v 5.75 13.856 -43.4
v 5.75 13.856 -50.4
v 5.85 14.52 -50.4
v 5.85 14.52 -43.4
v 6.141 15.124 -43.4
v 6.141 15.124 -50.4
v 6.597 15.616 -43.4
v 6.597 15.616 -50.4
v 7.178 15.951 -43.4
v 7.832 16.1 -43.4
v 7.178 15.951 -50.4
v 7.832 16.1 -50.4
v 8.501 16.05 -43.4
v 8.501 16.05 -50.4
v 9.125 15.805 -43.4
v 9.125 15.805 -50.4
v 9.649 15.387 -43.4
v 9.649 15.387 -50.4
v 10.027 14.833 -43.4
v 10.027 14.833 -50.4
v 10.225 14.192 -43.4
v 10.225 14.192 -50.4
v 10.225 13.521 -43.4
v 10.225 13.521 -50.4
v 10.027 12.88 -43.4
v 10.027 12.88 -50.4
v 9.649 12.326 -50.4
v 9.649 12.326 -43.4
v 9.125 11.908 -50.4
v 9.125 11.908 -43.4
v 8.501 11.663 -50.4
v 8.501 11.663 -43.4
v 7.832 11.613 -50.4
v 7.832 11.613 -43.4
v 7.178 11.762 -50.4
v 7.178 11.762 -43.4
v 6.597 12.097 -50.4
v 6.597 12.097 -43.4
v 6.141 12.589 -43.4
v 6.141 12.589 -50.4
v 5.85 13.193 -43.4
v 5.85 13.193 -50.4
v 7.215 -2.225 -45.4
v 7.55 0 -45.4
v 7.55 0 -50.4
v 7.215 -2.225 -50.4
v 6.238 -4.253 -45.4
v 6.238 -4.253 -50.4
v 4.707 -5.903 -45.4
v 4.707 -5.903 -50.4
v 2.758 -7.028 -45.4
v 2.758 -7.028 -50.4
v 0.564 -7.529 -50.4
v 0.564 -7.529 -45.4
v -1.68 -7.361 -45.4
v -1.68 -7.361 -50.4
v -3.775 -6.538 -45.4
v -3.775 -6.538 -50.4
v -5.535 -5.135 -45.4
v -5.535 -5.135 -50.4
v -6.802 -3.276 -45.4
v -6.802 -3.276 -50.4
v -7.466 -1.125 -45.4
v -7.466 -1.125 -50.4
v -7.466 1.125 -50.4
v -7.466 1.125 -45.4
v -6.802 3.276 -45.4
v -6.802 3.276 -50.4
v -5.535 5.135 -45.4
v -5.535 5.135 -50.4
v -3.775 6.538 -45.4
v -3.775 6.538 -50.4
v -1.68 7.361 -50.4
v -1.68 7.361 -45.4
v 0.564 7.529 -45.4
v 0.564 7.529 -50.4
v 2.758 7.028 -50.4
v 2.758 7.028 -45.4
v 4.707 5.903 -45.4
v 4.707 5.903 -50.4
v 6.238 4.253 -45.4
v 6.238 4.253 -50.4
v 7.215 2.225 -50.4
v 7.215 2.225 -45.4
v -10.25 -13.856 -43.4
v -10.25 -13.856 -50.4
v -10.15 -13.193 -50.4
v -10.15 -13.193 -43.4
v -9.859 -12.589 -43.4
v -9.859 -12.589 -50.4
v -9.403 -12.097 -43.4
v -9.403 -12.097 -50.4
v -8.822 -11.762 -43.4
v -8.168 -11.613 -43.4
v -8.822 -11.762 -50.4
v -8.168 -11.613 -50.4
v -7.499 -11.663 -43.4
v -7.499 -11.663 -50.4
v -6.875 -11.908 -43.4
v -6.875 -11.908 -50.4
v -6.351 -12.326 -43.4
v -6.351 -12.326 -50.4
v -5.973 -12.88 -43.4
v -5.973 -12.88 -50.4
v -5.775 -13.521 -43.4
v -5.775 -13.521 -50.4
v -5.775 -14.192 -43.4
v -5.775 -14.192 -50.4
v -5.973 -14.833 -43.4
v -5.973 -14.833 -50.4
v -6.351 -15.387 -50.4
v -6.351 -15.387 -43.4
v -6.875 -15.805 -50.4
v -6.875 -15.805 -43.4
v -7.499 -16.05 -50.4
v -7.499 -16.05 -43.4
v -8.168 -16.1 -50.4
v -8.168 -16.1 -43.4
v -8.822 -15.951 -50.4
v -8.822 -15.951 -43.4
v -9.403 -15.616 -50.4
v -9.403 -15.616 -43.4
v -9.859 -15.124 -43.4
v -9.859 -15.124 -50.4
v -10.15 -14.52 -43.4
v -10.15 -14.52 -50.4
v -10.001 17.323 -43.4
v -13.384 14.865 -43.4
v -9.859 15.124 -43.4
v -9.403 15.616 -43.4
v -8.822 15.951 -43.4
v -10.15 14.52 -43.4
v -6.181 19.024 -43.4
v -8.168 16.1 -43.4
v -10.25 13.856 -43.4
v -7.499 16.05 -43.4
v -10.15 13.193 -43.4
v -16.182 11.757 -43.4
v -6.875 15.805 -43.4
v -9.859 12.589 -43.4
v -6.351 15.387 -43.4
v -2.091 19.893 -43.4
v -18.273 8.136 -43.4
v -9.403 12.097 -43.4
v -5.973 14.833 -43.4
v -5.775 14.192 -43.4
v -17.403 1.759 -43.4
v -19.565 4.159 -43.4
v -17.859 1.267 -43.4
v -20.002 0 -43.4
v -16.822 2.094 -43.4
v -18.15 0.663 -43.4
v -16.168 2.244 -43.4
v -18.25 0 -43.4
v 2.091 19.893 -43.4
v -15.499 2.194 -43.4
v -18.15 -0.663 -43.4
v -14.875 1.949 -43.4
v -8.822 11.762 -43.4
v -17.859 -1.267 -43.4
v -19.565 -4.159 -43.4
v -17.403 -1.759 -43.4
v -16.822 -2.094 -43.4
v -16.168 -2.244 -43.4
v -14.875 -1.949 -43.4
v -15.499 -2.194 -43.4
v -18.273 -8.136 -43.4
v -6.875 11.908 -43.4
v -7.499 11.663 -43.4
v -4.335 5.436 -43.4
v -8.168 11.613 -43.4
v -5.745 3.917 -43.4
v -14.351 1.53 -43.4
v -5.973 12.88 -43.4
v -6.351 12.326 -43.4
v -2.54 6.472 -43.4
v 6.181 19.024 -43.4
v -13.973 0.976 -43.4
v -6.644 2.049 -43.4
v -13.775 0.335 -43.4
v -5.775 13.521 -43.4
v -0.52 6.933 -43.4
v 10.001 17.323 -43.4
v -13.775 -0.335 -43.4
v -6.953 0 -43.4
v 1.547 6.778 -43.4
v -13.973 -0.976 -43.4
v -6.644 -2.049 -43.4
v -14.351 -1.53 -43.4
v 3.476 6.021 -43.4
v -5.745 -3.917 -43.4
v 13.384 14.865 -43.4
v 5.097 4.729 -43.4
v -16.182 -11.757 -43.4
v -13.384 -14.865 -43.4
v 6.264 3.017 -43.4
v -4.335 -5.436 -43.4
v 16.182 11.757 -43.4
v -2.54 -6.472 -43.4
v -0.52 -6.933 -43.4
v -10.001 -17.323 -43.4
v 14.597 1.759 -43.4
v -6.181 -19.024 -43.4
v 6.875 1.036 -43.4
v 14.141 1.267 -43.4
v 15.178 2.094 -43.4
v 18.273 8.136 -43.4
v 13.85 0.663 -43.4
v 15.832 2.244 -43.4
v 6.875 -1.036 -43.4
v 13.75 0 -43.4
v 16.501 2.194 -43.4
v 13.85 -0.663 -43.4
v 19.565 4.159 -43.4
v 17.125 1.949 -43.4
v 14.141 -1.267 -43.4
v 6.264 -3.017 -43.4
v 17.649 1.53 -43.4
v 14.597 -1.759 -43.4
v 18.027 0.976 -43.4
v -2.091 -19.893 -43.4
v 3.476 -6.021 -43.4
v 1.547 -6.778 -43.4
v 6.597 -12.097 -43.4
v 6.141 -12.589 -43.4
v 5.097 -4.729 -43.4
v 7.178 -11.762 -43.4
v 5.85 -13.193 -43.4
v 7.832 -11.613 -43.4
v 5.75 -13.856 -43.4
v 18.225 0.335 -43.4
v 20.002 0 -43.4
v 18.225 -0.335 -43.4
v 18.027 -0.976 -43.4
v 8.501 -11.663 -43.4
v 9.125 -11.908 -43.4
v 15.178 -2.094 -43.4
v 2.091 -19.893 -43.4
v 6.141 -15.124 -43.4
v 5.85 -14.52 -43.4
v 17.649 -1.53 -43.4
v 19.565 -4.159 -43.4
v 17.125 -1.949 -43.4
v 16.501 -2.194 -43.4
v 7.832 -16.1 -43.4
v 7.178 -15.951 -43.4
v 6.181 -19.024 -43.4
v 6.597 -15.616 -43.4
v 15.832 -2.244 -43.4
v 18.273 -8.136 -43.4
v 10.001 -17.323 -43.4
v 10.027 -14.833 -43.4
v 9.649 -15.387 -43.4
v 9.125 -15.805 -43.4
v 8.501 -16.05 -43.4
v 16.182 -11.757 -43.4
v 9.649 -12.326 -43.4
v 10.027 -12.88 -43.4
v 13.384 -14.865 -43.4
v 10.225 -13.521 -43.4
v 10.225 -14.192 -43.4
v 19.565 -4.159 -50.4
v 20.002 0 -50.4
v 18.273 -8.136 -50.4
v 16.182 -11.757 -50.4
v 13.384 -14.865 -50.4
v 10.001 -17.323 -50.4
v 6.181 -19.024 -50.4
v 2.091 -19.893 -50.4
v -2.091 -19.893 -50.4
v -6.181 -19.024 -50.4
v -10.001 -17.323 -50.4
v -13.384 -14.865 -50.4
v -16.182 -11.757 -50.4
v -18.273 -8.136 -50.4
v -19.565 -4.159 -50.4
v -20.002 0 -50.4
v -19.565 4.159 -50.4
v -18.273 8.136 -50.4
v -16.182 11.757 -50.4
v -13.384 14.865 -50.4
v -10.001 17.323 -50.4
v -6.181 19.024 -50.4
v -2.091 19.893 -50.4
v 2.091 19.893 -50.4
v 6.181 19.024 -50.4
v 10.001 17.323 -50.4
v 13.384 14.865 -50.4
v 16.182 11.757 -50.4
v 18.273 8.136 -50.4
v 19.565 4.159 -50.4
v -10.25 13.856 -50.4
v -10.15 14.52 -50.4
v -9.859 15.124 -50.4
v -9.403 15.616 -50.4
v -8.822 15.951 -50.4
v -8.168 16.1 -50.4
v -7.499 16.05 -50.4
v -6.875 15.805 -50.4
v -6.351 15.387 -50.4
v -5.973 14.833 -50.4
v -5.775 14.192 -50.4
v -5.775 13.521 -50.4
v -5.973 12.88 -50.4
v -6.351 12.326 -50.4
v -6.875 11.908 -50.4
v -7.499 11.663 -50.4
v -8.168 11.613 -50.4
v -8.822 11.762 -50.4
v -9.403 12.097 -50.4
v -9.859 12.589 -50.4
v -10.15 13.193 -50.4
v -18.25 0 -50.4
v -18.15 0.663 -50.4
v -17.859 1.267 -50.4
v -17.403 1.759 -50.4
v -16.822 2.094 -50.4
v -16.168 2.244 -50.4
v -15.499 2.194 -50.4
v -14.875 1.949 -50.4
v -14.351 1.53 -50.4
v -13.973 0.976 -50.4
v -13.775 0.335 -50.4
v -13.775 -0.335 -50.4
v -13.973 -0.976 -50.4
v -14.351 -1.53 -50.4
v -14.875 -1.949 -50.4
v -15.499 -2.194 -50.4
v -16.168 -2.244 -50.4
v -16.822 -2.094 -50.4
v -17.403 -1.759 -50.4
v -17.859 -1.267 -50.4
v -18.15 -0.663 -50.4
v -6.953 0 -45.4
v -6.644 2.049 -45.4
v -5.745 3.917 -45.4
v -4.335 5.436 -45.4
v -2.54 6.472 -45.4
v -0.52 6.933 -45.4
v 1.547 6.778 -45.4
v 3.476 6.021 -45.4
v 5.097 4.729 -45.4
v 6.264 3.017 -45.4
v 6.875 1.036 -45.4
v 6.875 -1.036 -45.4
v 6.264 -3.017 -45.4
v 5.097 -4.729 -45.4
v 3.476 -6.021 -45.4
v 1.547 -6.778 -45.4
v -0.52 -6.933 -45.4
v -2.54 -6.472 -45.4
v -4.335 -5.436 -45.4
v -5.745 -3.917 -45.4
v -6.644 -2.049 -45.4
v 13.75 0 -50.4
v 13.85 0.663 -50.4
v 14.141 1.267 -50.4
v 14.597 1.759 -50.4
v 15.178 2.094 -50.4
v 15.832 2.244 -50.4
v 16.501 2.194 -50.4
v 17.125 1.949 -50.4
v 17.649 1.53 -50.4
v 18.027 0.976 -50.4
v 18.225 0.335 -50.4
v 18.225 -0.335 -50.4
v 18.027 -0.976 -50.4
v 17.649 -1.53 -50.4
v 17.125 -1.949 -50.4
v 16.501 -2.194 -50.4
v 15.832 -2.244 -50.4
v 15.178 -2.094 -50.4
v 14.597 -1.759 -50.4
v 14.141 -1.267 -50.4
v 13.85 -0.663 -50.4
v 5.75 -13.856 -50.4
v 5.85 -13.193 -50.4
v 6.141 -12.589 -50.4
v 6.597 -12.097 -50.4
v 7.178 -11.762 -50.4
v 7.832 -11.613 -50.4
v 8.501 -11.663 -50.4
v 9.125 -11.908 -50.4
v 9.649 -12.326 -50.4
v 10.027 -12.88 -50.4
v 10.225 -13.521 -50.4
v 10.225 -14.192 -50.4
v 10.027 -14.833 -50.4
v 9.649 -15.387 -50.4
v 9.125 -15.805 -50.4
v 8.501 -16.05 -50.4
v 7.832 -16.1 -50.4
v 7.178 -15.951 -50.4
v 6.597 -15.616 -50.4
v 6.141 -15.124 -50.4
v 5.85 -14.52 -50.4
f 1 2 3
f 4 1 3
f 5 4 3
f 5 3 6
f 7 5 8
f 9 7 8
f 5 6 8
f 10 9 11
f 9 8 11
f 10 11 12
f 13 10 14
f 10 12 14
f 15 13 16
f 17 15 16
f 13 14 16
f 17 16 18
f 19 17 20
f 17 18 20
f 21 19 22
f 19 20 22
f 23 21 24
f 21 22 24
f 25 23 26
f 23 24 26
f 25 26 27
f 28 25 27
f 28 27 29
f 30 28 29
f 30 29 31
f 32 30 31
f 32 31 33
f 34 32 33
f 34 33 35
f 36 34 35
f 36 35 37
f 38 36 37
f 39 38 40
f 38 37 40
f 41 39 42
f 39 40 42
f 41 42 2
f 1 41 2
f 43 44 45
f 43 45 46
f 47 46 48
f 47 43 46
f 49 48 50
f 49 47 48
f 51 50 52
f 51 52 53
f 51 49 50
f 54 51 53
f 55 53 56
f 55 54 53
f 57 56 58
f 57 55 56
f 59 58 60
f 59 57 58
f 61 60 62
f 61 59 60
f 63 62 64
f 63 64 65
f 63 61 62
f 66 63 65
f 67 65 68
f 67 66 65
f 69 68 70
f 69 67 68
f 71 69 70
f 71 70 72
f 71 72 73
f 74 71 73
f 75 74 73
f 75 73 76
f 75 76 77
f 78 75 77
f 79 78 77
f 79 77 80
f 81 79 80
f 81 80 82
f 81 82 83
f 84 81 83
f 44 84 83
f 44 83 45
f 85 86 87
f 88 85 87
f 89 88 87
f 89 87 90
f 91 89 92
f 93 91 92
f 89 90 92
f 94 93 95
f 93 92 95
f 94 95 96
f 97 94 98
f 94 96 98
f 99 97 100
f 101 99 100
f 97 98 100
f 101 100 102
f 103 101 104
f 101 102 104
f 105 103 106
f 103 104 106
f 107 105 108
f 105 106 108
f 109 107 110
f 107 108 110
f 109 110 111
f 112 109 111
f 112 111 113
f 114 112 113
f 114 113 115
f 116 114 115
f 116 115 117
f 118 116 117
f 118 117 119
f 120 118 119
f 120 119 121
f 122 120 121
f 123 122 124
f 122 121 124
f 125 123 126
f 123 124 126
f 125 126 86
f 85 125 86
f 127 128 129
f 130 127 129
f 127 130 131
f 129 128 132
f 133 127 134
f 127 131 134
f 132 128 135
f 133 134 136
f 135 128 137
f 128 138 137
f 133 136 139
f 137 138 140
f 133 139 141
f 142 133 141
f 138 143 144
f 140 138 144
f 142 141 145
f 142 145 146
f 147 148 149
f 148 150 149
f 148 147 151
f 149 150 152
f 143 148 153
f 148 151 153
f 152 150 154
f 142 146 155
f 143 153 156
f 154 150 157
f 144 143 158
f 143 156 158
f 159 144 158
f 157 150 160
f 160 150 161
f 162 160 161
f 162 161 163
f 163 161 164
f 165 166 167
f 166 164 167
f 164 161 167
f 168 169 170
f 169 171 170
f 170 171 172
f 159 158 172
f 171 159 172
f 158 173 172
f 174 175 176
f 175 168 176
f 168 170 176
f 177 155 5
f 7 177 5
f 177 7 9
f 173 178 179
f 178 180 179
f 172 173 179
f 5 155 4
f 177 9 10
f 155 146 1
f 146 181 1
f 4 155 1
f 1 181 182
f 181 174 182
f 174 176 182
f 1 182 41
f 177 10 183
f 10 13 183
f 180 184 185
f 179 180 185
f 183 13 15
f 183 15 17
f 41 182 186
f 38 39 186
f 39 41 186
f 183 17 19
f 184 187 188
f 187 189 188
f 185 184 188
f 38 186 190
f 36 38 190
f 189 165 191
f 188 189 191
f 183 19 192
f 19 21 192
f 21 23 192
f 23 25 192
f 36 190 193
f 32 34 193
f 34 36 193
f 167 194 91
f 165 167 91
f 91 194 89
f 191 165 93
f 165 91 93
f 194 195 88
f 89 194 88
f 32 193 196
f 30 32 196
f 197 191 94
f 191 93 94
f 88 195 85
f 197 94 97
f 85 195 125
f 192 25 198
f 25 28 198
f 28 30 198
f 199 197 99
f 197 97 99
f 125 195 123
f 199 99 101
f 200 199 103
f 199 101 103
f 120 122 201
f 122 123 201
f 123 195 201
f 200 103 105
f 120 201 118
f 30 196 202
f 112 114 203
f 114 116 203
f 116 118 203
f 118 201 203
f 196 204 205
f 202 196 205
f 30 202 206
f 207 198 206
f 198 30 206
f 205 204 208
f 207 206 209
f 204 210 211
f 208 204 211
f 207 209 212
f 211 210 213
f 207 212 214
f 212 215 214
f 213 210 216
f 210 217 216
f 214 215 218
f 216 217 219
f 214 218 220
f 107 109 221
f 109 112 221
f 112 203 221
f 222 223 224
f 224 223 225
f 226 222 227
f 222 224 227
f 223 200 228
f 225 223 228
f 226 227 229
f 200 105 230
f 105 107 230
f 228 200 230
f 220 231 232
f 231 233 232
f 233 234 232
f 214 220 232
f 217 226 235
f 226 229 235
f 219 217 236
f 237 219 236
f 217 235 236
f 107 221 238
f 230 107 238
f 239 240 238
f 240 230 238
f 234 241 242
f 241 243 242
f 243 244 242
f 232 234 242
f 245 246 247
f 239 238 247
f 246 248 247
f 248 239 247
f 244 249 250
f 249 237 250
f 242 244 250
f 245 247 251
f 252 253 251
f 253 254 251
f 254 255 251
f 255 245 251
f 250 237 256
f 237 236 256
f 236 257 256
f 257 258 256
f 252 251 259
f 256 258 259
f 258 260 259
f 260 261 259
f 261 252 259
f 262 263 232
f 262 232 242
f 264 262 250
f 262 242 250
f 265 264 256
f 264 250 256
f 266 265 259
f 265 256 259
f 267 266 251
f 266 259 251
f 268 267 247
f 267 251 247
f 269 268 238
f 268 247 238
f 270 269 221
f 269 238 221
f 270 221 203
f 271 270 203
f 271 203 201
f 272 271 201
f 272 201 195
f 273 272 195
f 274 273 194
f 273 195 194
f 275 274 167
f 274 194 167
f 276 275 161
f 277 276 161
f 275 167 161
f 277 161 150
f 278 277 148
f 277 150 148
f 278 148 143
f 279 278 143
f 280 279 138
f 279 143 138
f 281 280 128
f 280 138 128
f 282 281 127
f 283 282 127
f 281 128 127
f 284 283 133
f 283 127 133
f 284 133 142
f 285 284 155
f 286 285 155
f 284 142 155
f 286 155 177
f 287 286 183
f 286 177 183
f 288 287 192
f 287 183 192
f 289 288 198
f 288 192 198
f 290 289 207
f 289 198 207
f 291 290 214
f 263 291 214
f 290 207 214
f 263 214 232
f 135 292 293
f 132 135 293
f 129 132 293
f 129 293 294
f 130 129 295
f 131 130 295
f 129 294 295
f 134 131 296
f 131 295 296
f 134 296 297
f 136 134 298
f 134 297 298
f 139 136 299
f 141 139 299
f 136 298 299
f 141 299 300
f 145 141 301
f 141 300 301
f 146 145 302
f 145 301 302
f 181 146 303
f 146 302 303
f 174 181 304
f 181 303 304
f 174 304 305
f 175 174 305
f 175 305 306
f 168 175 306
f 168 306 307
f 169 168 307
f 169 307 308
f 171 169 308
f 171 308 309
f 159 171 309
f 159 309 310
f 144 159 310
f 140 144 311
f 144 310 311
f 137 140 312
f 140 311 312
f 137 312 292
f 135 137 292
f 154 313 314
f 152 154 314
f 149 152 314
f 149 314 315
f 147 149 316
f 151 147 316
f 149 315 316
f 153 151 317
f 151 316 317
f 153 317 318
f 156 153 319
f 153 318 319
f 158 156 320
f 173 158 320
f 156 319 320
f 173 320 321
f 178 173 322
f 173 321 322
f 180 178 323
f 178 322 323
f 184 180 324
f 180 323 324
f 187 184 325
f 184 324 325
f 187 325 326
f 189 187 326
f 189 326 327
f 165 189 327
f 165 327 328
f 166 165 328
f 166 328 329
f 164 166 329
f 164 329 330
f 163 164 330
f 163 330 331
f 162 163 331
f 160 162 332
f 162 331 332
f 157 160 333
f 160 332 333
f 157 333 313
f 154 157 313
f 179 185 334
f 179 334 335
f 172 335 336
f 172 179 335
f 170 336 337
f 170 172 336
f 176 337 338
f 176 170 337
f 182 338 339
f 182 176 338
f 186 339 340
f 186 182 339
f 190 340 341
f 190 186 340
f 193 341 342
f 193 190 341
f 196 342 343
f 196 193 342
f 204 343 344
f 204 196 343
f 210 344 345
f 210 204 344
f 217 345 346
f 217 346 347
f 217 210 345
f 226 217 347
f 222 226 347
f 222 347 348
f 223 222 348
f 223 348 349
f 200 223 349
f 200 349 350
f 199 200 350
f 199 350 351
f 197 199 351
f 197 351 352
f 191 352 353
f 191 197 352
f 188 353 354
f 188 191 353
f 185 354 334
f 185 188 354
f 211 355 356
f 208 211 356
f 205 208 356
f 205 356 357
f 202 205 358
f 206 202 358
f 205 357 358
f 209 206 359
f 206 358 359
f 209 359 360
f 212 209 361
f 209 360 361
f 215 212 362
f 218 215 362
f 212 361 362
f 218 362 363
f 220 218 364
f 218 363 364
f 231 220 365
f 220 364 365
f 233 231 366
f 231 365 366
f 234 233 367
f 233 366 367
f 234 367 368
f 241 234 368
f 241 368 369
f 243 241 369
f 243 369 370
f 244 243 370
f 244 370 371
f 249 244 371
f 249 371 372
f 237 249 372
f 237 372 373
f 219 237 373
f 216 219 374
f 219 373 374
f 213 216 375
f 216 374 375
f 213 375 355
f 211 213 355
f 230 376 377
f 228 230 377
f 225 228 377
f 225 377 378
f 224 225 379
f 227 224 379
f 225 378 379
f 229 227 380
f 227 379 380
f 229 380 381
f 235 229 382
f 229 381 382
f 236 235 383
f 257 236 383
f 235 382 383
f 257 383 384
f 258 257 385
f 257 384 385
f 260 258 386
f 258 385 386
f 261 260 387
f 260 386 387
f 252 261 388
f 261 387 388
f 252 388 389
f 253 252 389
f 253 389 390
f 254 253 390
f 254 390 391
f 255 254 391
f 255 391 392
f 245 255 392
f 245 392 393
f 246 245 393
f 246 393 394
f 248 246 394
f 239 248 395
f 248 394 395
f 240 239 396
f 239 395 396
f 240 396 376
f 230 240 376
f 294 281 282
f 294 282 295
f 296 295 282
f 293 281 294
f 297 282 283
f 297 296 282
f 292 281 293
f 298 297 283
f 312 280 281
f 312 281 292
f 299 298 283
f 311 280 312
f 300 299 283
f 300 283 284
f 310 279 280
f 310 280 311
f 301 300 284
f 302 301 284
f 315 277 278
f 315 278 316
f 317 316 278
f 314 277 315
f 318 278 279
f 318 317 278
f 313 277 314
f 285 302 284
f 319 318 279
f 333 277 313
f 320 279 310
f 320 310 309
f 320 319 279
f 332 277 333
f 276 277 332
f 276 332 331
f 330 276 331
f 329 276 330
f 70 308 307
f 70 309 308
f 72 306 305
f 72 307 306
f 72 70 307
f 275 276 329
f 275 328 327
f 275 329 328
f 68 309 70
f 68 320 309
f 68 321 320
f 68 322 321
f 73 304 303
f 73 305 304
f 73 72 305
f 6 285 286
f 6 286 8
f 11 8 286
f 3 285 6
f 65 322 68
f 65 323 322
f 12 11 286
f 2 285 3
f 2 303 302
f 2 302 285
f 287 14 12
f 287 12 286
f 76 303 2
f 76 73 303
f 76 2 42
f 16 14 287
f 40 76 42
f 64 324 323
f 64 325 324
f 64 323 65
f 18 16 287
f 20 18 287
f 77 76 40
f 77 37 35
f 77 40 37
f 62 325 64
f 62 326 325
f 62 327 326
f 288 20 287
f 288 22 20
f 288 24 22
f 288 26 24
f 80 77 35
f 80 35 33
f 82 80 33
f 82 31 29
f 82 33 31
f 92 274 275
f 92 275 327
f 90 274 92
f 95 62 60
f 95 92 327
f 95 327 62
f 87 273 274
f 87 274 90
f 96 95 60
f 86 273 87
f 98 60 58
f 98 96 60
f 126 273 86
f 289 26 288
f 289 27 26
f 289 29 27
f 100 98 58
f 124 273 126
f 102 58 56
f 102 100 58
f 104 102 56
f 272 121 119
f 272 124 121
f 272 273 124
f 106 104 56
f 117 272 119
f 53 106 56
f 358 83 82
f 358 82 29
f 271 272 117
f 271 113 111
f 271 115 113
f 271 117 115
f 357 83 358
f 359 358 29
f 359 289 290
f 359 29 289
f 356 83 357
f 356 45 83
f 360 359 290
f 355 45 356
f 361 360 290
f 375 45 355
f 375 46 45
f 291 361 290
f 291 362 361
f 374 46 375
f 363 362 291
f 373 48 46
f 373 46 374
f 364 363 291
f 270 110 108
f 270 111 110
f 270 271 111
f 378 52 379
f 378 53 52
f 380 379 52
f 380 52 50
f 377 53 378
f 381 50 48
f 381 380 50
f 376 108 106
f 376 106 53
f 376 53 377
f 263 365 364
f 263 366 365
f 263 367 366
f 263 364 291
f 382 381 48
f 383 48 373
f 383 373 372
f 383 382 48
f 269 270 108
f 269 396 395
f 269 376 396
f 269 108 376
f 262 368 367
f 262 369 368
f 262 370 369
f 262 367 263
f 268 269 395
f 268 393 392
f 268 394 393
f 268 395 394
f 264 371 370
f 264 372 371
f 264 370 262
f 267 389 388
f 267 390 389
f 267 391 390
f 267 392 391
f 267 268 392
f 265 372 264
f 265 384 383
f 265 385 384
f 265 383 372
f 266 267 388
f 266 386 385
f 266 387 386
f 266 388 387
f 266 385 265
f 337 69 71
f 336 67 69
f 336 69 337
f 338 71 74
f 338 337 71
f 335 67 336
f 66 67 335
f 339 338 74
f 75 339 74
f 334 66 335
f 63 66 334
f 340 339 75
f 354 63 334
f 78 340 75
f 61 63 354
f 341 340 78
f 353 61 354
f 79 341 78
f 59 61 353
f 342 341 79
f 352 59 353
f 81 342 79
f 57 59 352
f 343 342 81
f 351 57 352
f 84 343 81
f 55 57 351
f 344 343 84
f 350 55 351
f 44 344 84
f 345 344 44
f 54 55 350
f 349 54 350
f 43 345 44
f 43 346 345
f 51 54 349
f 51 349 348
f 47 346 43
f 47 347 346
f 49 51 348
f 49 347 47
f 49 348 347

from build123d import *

# Parameters (mm, degrees)
SKETCH1_R           = 20.0025
SKETCH1_R_2         = 7.55
BOSS_EXTRUDE1_DEPTH = 7
SKETCH2_R           = 7.55
SKETCH2_R_2         = 6.952615
BOSS_EXTRUDE2_DEPTH = 2
SKETCH3_R           = 2.25
CUT_EXTRUDE1_DEPTH  = 7


with BuildPart() as part:
    # Sketch1 → Boss-Extrude1 (new body)
    with BuildSketch(Plane(origin=(0, 0, -43.4), x_dir=(-1, 0, 0), z_dir=(0, 0, -1))):
        with Locations(Location((0, 0, 0), (0, 0, 180))):
            Circle(SKETCH1_R)
        with Locations(Location((0, 0, 0), (0, 0, 180))):
            Circle(SKETCH1_R_2, mode=Mode.SUBTRACT)
    extrude(amount=BOSS_EXTRUDE1_DEPTH)

    # Sketch2 → Boss-Extrude2 (add)
    with BuildSketch(Plane(origin=(0, 0, -43.4), x_dir=(-1, 0, 0), z_dir=(0, 0, -1))):
        with Locations(Location((0, 0, 0), (0, 0, 180))):
            Circle(SKETCH2_R)
        Circle(SKETCH2_R_2, mode=Mode.SUBTRACT)
    extrude(amount=BOSS_EXTRUDE2_DEPTH)

    # Sketch3 → Cut-Extrude1 (cut)
    with BuildSketch(Plane(origin=(0, 0, -50.4), x_dir=(-1, 0, 0), z_dir=(0, 0, -1))):
        with Locations((16, 0)):
            Circle(SKETCH3_R)
        with Locations((8, -13.856406461)):
            Circle(SKETCH3_R)
        with Locations((-8, -13.856406461)):
            Circle(SKETCH3_R)
        with Locations((-16, 0)):
            Circle(SKETCH3_R)
        with Locations((-8, 13.856406461)):
            Circle(SKETCH3_R)
        with Locations((8, 13.856406461)):
            Circle(SKETCH3_R)
    extrude(amount=-CUT_EXTRUDE1_DEPTH, mode=Mode.SUBTRACT)


solid = part.part
